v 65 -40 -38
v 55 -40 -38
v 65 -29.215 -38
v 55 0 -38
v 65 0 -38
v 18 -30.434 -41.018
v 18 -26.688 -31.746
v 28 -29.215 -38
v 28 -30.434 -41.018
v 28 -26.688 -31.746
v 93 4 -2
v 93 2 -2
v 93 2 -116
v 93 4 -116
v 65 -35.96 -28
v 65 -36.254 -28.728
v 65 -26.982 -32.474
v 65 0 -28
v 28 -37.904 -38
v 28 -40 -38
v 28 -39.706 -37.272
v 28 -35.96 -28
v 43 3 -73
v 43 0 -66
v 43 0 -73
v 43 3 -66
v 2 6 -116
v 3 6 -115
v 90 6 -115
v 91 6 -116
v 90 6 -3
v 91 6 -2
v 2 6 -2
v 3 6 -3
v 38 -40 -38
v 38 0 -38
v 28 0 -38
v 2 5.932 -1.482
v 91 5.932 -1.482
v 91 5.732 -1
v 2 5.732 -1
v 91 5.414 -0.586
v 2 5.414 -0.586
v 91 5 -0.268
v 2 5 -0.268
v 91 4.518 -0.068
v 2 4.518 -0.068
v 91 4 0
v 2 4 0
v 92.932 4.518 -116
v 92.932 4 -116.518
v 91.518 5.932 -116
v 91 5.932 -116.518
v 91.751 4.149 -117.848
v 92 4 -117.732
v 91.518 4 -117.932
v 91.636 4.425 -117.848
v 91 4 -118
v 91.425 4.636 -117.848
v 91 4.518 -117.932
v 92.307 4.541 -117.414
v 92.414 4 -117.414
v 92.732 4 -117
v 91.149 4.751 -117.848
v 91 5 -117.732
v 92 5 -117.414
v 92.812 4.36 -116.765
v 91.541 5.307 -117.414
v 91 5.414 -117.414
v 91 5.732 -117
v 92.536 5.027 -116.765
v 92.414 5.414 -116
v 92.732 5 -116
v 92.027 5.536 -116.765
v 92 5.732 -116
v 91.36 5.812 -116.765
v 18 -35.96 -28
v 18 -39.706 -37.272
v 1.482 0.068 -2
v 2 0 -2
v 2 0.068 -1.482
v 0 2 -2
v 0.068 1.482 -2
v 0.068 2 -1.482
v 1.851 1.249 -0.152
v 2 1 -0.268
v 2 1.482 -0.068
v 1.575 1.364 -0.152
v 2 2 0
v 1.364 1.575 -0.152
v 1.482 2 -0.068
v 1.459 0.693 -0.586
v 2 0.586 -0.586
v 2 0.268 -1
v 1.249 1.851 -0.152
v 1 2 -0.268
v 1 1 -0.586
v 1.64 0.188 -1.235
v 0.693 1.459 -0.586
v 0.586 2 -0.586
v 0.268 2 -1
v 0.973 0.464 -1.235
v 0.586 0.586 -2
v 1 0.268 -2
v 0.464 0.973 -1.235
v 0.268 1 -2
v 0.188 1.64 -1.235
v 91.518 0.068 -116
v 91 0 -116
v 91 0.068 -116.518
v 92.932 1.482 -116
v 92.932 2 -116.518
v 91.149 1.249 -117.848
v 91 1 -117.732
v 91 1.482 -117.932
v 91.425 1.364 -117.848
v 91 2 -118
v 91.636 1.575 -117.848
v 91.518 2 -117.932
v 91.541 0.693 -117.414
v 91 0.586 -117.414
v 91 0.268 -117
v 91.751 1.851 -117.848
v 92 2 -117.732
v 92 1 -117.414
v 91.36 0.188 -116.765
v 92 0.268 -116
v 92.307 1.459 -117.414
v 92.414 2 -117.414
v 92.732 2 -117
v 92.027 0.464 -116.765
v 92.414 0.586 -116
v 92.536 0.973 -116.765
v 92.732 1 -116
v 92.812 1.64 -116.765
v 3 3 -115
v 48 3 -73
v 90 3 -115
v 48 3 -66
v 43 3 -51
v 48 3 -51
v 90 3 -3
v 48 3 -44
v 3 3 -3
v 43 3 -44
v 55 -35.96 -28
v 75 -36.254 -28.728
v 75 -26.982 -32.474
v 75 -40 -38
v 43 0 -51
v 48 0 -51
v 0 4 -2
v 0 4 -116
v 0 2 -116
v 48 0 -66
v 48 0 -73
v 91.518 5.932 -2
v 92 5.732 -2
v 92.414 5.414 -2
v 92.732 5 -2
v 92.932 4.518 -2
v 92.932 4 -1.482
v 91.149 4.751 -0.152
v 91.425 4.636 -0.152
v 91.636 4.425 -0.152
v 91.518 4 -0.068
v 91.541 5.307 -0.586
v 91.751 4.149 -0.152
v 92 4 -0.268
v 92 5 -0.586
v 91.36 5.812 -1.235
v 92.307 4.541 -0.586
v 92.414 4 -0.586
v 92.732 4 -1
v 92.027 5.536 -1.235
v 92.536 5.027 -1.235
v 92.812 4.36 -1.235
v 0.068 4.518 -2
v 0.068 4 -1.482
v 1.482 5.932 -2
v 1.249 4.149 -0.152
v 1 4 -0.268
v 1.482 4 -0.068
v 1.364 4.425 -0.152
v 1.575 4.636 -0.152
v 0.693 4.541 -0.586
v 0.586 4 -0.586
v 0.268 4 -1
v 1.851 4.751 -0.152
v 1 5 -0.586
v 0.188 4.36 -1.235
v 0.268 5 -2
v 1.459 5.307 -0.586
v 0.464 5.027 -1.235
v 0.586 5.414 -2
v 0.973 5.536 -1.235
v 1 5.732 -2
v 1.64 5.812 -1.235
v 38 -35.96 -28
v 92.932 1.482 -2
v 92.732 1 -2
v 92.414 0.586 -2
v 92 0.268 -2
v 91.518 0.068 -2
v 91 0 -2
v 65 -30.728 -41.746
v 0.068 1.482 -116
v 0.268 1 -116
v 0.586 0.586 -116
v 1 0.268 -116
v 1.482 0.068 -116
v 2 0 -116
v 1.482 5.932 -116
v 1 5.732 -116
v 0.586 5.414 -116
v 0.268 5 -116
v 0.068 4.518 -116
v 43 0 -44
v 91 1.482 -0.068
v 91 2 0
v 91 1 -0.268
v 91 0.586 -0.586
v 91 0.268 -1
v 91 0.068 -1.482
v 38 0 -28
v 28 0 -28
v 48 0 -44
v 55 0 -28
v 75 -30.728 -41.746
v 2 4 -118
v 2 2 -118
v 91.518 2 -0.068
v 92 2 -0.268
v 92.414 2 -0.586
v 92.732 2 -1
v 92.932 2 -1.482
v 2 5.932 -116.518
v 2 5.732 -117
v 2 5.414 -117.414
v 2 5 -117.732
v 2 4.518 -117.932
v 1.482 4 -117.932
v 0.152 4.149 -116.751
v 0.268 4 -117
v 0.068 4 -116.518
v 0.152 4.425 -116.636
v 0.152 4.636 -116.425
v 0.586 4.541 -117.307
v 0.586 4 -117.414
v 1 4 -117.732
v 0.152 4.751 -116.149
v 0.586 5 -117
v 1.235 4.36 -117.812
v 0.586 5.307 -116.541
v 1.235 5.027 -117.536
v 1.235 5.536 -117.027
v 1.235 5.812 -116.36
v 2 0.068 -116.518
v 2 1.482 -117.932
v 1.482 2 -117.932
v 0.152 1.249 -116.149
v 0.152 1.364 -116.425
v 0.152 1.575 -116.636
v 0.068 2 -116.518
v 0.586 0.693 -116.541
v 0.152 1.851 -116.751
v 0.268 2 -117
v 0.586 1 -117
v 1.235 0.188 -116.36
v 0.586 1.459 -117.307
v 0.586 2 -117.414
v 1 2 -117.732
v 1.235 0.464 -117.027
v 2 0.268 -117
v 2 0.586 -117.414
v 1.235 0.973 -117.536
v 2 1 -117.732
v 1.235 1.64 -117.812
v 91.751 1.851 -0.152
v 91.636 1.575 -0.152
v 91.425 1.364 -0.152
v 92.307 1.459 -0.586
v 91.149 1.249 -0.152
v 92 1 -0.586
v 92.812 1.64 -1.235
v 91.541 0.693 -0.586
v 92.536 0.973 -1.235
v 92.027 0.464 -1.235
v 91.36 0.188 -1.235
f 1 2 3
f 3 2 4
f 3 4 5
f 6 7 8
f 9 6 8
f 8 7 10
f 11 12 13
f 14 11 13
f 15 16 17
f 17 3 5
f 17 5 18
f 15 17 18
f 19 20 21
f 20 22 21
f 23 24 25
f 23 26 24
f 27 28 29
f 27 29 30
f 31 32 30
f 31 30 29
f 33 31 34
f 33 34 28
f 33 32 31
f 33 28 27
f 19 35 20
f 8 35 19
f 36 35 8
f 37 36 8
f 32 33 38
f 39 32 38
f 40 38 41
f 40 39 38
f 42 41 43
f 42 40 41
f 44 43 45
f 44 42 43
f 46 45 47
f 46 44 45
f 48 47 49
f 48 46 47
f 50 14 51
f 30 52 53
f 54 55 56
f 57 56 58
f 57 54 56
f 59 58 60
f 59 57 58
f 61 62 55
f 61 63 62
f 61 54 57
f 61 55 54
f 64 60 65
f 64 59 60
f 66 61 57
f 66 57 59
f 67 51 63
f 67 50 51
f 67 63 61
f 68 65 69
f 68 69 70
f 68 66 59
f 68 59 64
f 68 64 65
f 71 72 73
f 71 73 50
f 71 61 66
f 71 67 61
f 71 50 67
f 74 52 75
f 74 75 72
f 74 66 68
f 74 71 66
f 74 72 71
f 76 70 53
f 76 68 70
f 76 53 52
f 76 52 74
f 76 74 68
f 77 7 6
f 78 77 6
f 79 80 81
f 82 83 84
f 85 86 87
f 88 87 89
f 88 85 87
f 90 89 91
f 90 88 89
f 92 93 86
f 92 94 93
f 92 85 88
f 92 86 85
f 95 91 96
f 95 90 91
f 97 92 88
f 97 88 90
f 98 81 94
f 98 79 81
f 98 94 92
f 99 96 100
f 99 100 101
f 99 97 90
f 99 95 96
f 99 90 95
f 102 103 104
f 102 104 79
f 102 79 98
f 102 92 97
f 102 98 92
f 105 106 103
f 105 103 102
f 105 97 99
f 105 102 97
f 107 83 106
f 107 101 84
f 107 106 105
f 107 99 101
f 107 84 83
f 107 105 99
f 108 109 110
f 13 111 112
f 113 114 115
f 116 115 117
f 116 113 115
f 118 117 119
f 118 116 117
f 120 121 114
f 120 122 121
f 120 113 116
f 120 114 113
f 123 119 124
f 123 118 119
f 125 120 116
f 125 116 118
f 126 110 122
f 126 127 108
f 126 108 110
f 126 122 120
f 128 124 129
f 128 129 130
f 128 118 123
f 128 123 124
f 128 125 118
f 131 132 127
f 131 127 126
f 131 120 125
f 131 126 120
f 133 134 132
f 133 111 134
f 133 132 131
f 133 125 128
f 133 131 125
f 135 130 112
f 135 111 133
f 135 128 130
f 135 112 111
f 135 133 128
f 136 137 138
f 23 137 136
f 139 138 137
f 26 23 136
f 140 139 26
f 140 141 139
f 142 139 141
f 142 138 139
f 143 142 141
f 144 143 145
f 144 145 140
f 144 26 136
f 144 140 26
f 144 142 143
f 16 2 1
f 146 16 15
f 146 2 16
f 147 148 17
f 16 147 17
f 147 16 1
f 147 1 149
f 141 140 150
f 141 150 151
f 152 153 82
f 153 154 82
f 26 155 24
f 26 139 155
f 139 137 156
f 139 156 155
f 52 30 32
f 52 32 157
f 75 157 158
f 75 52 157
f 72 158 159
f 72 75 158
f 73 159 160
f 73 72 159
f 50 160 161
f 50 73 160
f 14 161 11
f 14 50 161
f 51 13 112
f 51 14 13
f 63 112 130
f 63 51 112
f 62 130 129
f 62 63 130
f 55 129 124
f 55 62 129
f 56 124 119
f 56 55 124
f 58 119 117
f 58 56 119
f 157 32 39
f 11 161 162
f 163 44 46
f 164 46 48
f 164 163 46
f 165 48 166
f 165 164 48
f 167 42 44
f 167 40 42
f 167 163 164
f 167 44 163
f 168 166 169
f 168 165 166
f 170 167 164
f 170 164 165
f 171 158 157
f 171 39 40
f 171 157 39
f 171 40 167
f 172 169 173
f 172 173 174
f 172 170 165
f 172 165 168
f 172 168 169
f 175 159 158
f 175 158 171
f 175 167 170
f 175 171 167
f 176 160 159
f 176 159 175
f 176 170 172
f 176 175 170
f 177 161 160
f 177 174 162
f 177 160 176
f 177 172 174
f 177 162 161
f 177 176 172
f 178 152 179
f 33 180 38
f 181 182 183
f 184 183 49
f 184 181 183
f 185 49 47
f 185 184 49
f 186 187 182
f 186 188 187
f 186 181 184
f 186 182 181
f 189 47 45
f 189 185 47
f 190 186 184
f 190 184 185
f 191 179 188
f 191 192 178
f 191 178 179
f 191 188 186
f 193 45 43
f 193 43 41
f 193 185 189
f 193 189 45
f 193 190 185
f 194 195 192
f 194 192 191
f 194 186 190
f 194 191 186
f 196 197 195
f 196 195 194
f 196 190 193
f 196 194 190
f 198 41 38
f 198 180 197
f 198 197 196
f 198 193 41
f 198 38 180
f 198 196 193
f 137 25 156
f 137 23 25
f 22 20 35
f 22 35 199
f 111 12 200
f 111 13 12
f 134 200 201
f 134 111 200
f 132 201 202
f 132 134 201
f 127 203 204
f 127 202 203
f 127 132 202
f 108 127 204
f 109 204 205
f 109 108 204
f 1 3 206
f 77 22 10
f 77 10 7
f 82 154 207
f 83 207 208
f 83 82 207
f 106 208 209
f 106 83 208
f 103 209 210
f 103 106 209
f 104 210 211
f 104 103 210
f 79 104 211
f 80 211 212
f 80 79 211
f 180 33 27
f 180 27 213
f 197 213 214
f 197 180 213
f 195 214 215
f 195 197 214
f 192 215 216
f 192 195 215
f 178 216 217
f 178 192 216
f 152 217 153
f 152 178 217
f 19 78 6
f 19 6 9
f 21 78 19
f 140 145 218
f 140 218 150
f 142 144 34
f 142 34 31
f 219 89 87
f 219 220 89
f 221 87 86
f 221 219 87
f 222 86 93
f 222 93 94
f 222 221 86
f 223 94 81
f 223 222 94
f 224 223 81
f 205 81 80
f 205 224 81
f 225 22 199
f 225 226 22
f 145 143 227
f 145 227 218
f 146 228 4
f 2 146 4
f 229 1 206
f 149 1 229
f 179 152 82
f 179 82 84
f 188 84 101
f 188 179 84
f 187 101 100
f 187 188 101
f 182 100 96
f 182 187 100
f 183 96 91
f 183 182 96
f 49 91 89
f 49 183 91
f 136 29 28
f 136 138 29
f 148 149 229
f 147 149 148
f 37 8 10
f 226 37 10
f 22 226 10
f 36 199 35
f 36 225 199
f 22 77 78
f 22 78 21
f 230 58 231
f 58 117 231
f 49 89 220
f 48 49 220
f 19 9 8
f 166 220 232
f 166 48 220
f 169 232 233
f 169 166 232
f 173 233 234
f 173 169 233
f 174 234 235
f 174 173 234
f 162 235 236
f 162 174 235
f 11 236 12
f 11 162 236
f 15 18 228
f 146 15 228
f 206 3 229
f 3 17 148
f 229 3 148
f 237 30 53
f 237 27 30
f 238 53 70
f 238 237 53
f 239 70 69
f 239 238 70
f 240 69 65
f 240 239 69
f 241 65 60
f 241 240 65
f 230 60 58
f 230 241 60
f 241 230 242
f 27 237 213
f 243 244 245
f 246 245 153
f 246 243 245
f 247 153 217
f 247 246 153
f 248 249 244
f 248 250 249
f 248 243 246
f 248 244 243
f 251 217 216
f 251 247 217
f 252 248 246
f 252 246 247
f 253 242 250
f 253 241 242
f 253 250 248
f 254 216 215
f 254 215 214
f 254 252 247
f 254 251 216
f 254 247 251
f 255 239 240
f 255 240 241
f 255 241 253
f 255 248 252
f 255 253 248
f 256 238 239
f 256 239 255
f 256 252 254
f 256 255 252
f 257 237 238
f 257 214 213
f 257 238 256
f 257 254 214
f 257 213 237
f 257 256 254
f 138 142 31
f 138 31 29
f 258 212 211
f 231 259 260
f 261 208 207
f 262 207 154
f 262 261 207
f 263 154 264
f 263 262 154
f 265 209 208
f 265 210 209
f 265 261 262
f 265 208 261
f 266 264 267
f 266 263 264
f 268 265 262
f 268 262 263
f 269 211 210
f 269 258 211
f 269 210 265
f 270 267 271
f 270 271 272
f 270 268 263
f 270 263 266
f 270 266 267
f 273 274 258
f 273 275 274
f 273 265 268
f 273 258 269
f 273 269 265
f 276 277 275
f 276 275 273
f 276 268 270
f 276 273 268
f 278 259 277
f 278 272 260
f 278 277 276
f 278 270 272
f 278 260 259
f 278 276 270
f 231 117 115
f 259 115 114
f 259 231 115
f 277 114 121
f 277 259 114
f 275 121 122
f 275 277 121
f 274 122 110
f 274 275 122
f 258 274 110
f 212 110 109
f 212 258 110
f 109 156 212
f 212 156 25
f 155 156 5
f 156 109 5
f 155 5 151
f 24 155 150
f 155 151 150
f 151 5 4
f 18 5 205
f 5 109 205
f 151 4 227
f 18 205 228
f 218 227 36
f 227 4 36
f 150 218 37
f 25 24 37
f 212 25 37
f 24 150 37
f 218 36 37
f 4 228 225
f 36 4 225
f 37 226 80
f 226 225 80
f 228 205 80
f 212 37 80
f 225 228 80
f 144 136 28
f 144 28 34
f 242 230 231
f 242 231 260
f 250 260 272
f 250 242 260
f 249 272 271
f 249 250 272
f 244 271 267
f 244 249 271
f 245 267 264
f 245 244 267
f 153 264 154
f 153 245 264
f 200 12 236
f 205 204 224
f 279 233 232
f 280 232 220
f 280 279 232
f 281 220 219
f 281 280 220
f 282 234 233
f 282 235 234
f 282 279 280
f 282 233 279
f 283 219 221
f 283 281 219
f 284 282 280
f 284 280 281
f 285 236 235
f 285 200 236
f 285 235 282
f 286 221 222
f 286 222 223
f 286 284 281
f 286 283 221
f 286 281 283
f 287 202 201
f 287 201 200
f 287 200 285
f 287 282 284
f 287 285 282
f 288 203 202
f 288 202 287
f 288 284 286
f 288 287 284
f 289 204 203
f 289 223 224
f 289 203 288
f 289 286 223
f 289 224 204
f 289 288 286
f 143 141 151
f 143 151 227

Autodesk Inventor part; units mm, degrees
ref_plane "YZ Plane" through (0, 0, 0) normal (1, 0, 0) x (0, 1, 0)
ref_plane "XZ Plane" through (0, 0, 0) normal (0, 1, 0) x (-1, 0, 0)
ref_plane "XY Plane" through (0, 0, 0) normal (0, 0, 1) x (1, 0, 0)
sketch "Boceto1" plane through (0, 0, 0) normal (0, 1, 0) x (-1, 0, 0)
  line L0 (0, 0) -> (-93, 0)
  line L1 (-93, 0) -> (-93, -118)
  line L2 (-93, -118) -> (0, -118)
  line L3 (0, -118) -> (0, 0)
  dimension "d0" = 93
  dimension "d1" = 118
extrude "Extrusión1" add sketch "Boceto1" along normal blind 6
shell "Vaciado1" thickness 3 removed faces 1 at (62, 6, -39.3333)
sketch "Boceto11" plane through (3, 3, -3) normal (0, 1, 0) x (1, 0, 0)
  line L0 (40, 70) -> (45, 70)
  line L1 (45, 70) -> (45, 63)
  line L2 (45, 63) -> (40, 63)
  line L3 (40, 63) -> (40, 70)
  line L4 (40, 48) -> (45, 48)
  line L5 (45, 48) -> (45, 41)
  line L6 (45, 41) -> (40, 41)
  line L7 (40, 41) -> (40, 48)
  point P0 (-3, -3)
  dimension "d33" = 5
  dimension "d34" = 7
  dimension "d35" = 5
  dimension "d36" = 7
extrude "Extrusión8" cut sketch "Boceto11" against normal blind 7
sketch "Boceto12" plane through (0, 0, 0) normal (0, -1, 0) x (1, 0, 0)
  line L0 (28, -28) -> (38, -28)
  line L1 (38, -28) -> (38, -38)
  line L2 (38, -38) -> (28, -38)
  line L3 (28, -38) -> (28, -28)
  line L4 (55, -38) -> (65, -38)
  line L5 (65, -38) -> (65, -28)
  line L6 (65, -28) -> (55, -28)
  line L7 (55, -28) -> (55, -38)
  point P0 (0, 0)
  dimension "d39" = 10
  dimension "d40" = 10
  dimension "d41" = 10
  dimension "d42" = 10
extrude "Extrusión9" add sketch "Boceto12" along normal blind 40
sketch "Boceto13" plane through (28, 0, -38) normal (-1, 0, 0) x (0, 0, 1)
  line L0 (10, -40) -> (0, -40) projected
  line L1 (0, -40) -> (10, -35.9597)
  line L2 (10, 0) -> (10, -40) projected
  line L3 (0, -40) -> (10.7853, -40) construction
  point P0 (38, 0)
  dimension "d45" = 22
extrude "Extrusión10" cut sketch "Boceto13" against normal blind 40
sketch "Boceto14" plane through (28, -35.9597, -28) normal (0, -0.9272, 0.3746) x (1, 0, 0)
  line L0 (0, 13.4708) -> (0, 0) projected
  line L1 (0, 0) -> (-10, 0)
  line L2 (-10, 0) -> (-10, -10)
  line L3 (-10, -10) -> (0, -10)
  line L4 (0, -10) -> (0, 0)
  line L5 (37, 0) -> (37, -10.7853) projected
  line L6 (37, -10.7853) -> (47, -10.7853)
  line L7 (47, -10.7853) -> (47, -0.7853)
  line L8 (47, -0.7853) -> (37, -0.7853)
  line L9 (37, -0.7853) -> (37, -10.7853)
  point P0 (-28, 39.4319)
  point P1 (37, -0.7853)
  dimension "d48" = 10
  dimension "d49" = 10
  dimension "d50" = 10
  dimension "d51" = 10
extrude "Extrusión11" add sketch "Boceto14" against normal blind 10
fillet "Empalme1" radius 2 12 edges at (93, 6, -59) (93, 0, -59) (46.5, 0, -118) (46.5, 6, -118) (0, 6, -59) (0, 0, -59) (0, 3, -118) (93, 3, -118) (0, 3, 0) (46.5, 6, 0) (46.5, 0, 0) (93, 3, 0)
properties part number "Piezatapa"
